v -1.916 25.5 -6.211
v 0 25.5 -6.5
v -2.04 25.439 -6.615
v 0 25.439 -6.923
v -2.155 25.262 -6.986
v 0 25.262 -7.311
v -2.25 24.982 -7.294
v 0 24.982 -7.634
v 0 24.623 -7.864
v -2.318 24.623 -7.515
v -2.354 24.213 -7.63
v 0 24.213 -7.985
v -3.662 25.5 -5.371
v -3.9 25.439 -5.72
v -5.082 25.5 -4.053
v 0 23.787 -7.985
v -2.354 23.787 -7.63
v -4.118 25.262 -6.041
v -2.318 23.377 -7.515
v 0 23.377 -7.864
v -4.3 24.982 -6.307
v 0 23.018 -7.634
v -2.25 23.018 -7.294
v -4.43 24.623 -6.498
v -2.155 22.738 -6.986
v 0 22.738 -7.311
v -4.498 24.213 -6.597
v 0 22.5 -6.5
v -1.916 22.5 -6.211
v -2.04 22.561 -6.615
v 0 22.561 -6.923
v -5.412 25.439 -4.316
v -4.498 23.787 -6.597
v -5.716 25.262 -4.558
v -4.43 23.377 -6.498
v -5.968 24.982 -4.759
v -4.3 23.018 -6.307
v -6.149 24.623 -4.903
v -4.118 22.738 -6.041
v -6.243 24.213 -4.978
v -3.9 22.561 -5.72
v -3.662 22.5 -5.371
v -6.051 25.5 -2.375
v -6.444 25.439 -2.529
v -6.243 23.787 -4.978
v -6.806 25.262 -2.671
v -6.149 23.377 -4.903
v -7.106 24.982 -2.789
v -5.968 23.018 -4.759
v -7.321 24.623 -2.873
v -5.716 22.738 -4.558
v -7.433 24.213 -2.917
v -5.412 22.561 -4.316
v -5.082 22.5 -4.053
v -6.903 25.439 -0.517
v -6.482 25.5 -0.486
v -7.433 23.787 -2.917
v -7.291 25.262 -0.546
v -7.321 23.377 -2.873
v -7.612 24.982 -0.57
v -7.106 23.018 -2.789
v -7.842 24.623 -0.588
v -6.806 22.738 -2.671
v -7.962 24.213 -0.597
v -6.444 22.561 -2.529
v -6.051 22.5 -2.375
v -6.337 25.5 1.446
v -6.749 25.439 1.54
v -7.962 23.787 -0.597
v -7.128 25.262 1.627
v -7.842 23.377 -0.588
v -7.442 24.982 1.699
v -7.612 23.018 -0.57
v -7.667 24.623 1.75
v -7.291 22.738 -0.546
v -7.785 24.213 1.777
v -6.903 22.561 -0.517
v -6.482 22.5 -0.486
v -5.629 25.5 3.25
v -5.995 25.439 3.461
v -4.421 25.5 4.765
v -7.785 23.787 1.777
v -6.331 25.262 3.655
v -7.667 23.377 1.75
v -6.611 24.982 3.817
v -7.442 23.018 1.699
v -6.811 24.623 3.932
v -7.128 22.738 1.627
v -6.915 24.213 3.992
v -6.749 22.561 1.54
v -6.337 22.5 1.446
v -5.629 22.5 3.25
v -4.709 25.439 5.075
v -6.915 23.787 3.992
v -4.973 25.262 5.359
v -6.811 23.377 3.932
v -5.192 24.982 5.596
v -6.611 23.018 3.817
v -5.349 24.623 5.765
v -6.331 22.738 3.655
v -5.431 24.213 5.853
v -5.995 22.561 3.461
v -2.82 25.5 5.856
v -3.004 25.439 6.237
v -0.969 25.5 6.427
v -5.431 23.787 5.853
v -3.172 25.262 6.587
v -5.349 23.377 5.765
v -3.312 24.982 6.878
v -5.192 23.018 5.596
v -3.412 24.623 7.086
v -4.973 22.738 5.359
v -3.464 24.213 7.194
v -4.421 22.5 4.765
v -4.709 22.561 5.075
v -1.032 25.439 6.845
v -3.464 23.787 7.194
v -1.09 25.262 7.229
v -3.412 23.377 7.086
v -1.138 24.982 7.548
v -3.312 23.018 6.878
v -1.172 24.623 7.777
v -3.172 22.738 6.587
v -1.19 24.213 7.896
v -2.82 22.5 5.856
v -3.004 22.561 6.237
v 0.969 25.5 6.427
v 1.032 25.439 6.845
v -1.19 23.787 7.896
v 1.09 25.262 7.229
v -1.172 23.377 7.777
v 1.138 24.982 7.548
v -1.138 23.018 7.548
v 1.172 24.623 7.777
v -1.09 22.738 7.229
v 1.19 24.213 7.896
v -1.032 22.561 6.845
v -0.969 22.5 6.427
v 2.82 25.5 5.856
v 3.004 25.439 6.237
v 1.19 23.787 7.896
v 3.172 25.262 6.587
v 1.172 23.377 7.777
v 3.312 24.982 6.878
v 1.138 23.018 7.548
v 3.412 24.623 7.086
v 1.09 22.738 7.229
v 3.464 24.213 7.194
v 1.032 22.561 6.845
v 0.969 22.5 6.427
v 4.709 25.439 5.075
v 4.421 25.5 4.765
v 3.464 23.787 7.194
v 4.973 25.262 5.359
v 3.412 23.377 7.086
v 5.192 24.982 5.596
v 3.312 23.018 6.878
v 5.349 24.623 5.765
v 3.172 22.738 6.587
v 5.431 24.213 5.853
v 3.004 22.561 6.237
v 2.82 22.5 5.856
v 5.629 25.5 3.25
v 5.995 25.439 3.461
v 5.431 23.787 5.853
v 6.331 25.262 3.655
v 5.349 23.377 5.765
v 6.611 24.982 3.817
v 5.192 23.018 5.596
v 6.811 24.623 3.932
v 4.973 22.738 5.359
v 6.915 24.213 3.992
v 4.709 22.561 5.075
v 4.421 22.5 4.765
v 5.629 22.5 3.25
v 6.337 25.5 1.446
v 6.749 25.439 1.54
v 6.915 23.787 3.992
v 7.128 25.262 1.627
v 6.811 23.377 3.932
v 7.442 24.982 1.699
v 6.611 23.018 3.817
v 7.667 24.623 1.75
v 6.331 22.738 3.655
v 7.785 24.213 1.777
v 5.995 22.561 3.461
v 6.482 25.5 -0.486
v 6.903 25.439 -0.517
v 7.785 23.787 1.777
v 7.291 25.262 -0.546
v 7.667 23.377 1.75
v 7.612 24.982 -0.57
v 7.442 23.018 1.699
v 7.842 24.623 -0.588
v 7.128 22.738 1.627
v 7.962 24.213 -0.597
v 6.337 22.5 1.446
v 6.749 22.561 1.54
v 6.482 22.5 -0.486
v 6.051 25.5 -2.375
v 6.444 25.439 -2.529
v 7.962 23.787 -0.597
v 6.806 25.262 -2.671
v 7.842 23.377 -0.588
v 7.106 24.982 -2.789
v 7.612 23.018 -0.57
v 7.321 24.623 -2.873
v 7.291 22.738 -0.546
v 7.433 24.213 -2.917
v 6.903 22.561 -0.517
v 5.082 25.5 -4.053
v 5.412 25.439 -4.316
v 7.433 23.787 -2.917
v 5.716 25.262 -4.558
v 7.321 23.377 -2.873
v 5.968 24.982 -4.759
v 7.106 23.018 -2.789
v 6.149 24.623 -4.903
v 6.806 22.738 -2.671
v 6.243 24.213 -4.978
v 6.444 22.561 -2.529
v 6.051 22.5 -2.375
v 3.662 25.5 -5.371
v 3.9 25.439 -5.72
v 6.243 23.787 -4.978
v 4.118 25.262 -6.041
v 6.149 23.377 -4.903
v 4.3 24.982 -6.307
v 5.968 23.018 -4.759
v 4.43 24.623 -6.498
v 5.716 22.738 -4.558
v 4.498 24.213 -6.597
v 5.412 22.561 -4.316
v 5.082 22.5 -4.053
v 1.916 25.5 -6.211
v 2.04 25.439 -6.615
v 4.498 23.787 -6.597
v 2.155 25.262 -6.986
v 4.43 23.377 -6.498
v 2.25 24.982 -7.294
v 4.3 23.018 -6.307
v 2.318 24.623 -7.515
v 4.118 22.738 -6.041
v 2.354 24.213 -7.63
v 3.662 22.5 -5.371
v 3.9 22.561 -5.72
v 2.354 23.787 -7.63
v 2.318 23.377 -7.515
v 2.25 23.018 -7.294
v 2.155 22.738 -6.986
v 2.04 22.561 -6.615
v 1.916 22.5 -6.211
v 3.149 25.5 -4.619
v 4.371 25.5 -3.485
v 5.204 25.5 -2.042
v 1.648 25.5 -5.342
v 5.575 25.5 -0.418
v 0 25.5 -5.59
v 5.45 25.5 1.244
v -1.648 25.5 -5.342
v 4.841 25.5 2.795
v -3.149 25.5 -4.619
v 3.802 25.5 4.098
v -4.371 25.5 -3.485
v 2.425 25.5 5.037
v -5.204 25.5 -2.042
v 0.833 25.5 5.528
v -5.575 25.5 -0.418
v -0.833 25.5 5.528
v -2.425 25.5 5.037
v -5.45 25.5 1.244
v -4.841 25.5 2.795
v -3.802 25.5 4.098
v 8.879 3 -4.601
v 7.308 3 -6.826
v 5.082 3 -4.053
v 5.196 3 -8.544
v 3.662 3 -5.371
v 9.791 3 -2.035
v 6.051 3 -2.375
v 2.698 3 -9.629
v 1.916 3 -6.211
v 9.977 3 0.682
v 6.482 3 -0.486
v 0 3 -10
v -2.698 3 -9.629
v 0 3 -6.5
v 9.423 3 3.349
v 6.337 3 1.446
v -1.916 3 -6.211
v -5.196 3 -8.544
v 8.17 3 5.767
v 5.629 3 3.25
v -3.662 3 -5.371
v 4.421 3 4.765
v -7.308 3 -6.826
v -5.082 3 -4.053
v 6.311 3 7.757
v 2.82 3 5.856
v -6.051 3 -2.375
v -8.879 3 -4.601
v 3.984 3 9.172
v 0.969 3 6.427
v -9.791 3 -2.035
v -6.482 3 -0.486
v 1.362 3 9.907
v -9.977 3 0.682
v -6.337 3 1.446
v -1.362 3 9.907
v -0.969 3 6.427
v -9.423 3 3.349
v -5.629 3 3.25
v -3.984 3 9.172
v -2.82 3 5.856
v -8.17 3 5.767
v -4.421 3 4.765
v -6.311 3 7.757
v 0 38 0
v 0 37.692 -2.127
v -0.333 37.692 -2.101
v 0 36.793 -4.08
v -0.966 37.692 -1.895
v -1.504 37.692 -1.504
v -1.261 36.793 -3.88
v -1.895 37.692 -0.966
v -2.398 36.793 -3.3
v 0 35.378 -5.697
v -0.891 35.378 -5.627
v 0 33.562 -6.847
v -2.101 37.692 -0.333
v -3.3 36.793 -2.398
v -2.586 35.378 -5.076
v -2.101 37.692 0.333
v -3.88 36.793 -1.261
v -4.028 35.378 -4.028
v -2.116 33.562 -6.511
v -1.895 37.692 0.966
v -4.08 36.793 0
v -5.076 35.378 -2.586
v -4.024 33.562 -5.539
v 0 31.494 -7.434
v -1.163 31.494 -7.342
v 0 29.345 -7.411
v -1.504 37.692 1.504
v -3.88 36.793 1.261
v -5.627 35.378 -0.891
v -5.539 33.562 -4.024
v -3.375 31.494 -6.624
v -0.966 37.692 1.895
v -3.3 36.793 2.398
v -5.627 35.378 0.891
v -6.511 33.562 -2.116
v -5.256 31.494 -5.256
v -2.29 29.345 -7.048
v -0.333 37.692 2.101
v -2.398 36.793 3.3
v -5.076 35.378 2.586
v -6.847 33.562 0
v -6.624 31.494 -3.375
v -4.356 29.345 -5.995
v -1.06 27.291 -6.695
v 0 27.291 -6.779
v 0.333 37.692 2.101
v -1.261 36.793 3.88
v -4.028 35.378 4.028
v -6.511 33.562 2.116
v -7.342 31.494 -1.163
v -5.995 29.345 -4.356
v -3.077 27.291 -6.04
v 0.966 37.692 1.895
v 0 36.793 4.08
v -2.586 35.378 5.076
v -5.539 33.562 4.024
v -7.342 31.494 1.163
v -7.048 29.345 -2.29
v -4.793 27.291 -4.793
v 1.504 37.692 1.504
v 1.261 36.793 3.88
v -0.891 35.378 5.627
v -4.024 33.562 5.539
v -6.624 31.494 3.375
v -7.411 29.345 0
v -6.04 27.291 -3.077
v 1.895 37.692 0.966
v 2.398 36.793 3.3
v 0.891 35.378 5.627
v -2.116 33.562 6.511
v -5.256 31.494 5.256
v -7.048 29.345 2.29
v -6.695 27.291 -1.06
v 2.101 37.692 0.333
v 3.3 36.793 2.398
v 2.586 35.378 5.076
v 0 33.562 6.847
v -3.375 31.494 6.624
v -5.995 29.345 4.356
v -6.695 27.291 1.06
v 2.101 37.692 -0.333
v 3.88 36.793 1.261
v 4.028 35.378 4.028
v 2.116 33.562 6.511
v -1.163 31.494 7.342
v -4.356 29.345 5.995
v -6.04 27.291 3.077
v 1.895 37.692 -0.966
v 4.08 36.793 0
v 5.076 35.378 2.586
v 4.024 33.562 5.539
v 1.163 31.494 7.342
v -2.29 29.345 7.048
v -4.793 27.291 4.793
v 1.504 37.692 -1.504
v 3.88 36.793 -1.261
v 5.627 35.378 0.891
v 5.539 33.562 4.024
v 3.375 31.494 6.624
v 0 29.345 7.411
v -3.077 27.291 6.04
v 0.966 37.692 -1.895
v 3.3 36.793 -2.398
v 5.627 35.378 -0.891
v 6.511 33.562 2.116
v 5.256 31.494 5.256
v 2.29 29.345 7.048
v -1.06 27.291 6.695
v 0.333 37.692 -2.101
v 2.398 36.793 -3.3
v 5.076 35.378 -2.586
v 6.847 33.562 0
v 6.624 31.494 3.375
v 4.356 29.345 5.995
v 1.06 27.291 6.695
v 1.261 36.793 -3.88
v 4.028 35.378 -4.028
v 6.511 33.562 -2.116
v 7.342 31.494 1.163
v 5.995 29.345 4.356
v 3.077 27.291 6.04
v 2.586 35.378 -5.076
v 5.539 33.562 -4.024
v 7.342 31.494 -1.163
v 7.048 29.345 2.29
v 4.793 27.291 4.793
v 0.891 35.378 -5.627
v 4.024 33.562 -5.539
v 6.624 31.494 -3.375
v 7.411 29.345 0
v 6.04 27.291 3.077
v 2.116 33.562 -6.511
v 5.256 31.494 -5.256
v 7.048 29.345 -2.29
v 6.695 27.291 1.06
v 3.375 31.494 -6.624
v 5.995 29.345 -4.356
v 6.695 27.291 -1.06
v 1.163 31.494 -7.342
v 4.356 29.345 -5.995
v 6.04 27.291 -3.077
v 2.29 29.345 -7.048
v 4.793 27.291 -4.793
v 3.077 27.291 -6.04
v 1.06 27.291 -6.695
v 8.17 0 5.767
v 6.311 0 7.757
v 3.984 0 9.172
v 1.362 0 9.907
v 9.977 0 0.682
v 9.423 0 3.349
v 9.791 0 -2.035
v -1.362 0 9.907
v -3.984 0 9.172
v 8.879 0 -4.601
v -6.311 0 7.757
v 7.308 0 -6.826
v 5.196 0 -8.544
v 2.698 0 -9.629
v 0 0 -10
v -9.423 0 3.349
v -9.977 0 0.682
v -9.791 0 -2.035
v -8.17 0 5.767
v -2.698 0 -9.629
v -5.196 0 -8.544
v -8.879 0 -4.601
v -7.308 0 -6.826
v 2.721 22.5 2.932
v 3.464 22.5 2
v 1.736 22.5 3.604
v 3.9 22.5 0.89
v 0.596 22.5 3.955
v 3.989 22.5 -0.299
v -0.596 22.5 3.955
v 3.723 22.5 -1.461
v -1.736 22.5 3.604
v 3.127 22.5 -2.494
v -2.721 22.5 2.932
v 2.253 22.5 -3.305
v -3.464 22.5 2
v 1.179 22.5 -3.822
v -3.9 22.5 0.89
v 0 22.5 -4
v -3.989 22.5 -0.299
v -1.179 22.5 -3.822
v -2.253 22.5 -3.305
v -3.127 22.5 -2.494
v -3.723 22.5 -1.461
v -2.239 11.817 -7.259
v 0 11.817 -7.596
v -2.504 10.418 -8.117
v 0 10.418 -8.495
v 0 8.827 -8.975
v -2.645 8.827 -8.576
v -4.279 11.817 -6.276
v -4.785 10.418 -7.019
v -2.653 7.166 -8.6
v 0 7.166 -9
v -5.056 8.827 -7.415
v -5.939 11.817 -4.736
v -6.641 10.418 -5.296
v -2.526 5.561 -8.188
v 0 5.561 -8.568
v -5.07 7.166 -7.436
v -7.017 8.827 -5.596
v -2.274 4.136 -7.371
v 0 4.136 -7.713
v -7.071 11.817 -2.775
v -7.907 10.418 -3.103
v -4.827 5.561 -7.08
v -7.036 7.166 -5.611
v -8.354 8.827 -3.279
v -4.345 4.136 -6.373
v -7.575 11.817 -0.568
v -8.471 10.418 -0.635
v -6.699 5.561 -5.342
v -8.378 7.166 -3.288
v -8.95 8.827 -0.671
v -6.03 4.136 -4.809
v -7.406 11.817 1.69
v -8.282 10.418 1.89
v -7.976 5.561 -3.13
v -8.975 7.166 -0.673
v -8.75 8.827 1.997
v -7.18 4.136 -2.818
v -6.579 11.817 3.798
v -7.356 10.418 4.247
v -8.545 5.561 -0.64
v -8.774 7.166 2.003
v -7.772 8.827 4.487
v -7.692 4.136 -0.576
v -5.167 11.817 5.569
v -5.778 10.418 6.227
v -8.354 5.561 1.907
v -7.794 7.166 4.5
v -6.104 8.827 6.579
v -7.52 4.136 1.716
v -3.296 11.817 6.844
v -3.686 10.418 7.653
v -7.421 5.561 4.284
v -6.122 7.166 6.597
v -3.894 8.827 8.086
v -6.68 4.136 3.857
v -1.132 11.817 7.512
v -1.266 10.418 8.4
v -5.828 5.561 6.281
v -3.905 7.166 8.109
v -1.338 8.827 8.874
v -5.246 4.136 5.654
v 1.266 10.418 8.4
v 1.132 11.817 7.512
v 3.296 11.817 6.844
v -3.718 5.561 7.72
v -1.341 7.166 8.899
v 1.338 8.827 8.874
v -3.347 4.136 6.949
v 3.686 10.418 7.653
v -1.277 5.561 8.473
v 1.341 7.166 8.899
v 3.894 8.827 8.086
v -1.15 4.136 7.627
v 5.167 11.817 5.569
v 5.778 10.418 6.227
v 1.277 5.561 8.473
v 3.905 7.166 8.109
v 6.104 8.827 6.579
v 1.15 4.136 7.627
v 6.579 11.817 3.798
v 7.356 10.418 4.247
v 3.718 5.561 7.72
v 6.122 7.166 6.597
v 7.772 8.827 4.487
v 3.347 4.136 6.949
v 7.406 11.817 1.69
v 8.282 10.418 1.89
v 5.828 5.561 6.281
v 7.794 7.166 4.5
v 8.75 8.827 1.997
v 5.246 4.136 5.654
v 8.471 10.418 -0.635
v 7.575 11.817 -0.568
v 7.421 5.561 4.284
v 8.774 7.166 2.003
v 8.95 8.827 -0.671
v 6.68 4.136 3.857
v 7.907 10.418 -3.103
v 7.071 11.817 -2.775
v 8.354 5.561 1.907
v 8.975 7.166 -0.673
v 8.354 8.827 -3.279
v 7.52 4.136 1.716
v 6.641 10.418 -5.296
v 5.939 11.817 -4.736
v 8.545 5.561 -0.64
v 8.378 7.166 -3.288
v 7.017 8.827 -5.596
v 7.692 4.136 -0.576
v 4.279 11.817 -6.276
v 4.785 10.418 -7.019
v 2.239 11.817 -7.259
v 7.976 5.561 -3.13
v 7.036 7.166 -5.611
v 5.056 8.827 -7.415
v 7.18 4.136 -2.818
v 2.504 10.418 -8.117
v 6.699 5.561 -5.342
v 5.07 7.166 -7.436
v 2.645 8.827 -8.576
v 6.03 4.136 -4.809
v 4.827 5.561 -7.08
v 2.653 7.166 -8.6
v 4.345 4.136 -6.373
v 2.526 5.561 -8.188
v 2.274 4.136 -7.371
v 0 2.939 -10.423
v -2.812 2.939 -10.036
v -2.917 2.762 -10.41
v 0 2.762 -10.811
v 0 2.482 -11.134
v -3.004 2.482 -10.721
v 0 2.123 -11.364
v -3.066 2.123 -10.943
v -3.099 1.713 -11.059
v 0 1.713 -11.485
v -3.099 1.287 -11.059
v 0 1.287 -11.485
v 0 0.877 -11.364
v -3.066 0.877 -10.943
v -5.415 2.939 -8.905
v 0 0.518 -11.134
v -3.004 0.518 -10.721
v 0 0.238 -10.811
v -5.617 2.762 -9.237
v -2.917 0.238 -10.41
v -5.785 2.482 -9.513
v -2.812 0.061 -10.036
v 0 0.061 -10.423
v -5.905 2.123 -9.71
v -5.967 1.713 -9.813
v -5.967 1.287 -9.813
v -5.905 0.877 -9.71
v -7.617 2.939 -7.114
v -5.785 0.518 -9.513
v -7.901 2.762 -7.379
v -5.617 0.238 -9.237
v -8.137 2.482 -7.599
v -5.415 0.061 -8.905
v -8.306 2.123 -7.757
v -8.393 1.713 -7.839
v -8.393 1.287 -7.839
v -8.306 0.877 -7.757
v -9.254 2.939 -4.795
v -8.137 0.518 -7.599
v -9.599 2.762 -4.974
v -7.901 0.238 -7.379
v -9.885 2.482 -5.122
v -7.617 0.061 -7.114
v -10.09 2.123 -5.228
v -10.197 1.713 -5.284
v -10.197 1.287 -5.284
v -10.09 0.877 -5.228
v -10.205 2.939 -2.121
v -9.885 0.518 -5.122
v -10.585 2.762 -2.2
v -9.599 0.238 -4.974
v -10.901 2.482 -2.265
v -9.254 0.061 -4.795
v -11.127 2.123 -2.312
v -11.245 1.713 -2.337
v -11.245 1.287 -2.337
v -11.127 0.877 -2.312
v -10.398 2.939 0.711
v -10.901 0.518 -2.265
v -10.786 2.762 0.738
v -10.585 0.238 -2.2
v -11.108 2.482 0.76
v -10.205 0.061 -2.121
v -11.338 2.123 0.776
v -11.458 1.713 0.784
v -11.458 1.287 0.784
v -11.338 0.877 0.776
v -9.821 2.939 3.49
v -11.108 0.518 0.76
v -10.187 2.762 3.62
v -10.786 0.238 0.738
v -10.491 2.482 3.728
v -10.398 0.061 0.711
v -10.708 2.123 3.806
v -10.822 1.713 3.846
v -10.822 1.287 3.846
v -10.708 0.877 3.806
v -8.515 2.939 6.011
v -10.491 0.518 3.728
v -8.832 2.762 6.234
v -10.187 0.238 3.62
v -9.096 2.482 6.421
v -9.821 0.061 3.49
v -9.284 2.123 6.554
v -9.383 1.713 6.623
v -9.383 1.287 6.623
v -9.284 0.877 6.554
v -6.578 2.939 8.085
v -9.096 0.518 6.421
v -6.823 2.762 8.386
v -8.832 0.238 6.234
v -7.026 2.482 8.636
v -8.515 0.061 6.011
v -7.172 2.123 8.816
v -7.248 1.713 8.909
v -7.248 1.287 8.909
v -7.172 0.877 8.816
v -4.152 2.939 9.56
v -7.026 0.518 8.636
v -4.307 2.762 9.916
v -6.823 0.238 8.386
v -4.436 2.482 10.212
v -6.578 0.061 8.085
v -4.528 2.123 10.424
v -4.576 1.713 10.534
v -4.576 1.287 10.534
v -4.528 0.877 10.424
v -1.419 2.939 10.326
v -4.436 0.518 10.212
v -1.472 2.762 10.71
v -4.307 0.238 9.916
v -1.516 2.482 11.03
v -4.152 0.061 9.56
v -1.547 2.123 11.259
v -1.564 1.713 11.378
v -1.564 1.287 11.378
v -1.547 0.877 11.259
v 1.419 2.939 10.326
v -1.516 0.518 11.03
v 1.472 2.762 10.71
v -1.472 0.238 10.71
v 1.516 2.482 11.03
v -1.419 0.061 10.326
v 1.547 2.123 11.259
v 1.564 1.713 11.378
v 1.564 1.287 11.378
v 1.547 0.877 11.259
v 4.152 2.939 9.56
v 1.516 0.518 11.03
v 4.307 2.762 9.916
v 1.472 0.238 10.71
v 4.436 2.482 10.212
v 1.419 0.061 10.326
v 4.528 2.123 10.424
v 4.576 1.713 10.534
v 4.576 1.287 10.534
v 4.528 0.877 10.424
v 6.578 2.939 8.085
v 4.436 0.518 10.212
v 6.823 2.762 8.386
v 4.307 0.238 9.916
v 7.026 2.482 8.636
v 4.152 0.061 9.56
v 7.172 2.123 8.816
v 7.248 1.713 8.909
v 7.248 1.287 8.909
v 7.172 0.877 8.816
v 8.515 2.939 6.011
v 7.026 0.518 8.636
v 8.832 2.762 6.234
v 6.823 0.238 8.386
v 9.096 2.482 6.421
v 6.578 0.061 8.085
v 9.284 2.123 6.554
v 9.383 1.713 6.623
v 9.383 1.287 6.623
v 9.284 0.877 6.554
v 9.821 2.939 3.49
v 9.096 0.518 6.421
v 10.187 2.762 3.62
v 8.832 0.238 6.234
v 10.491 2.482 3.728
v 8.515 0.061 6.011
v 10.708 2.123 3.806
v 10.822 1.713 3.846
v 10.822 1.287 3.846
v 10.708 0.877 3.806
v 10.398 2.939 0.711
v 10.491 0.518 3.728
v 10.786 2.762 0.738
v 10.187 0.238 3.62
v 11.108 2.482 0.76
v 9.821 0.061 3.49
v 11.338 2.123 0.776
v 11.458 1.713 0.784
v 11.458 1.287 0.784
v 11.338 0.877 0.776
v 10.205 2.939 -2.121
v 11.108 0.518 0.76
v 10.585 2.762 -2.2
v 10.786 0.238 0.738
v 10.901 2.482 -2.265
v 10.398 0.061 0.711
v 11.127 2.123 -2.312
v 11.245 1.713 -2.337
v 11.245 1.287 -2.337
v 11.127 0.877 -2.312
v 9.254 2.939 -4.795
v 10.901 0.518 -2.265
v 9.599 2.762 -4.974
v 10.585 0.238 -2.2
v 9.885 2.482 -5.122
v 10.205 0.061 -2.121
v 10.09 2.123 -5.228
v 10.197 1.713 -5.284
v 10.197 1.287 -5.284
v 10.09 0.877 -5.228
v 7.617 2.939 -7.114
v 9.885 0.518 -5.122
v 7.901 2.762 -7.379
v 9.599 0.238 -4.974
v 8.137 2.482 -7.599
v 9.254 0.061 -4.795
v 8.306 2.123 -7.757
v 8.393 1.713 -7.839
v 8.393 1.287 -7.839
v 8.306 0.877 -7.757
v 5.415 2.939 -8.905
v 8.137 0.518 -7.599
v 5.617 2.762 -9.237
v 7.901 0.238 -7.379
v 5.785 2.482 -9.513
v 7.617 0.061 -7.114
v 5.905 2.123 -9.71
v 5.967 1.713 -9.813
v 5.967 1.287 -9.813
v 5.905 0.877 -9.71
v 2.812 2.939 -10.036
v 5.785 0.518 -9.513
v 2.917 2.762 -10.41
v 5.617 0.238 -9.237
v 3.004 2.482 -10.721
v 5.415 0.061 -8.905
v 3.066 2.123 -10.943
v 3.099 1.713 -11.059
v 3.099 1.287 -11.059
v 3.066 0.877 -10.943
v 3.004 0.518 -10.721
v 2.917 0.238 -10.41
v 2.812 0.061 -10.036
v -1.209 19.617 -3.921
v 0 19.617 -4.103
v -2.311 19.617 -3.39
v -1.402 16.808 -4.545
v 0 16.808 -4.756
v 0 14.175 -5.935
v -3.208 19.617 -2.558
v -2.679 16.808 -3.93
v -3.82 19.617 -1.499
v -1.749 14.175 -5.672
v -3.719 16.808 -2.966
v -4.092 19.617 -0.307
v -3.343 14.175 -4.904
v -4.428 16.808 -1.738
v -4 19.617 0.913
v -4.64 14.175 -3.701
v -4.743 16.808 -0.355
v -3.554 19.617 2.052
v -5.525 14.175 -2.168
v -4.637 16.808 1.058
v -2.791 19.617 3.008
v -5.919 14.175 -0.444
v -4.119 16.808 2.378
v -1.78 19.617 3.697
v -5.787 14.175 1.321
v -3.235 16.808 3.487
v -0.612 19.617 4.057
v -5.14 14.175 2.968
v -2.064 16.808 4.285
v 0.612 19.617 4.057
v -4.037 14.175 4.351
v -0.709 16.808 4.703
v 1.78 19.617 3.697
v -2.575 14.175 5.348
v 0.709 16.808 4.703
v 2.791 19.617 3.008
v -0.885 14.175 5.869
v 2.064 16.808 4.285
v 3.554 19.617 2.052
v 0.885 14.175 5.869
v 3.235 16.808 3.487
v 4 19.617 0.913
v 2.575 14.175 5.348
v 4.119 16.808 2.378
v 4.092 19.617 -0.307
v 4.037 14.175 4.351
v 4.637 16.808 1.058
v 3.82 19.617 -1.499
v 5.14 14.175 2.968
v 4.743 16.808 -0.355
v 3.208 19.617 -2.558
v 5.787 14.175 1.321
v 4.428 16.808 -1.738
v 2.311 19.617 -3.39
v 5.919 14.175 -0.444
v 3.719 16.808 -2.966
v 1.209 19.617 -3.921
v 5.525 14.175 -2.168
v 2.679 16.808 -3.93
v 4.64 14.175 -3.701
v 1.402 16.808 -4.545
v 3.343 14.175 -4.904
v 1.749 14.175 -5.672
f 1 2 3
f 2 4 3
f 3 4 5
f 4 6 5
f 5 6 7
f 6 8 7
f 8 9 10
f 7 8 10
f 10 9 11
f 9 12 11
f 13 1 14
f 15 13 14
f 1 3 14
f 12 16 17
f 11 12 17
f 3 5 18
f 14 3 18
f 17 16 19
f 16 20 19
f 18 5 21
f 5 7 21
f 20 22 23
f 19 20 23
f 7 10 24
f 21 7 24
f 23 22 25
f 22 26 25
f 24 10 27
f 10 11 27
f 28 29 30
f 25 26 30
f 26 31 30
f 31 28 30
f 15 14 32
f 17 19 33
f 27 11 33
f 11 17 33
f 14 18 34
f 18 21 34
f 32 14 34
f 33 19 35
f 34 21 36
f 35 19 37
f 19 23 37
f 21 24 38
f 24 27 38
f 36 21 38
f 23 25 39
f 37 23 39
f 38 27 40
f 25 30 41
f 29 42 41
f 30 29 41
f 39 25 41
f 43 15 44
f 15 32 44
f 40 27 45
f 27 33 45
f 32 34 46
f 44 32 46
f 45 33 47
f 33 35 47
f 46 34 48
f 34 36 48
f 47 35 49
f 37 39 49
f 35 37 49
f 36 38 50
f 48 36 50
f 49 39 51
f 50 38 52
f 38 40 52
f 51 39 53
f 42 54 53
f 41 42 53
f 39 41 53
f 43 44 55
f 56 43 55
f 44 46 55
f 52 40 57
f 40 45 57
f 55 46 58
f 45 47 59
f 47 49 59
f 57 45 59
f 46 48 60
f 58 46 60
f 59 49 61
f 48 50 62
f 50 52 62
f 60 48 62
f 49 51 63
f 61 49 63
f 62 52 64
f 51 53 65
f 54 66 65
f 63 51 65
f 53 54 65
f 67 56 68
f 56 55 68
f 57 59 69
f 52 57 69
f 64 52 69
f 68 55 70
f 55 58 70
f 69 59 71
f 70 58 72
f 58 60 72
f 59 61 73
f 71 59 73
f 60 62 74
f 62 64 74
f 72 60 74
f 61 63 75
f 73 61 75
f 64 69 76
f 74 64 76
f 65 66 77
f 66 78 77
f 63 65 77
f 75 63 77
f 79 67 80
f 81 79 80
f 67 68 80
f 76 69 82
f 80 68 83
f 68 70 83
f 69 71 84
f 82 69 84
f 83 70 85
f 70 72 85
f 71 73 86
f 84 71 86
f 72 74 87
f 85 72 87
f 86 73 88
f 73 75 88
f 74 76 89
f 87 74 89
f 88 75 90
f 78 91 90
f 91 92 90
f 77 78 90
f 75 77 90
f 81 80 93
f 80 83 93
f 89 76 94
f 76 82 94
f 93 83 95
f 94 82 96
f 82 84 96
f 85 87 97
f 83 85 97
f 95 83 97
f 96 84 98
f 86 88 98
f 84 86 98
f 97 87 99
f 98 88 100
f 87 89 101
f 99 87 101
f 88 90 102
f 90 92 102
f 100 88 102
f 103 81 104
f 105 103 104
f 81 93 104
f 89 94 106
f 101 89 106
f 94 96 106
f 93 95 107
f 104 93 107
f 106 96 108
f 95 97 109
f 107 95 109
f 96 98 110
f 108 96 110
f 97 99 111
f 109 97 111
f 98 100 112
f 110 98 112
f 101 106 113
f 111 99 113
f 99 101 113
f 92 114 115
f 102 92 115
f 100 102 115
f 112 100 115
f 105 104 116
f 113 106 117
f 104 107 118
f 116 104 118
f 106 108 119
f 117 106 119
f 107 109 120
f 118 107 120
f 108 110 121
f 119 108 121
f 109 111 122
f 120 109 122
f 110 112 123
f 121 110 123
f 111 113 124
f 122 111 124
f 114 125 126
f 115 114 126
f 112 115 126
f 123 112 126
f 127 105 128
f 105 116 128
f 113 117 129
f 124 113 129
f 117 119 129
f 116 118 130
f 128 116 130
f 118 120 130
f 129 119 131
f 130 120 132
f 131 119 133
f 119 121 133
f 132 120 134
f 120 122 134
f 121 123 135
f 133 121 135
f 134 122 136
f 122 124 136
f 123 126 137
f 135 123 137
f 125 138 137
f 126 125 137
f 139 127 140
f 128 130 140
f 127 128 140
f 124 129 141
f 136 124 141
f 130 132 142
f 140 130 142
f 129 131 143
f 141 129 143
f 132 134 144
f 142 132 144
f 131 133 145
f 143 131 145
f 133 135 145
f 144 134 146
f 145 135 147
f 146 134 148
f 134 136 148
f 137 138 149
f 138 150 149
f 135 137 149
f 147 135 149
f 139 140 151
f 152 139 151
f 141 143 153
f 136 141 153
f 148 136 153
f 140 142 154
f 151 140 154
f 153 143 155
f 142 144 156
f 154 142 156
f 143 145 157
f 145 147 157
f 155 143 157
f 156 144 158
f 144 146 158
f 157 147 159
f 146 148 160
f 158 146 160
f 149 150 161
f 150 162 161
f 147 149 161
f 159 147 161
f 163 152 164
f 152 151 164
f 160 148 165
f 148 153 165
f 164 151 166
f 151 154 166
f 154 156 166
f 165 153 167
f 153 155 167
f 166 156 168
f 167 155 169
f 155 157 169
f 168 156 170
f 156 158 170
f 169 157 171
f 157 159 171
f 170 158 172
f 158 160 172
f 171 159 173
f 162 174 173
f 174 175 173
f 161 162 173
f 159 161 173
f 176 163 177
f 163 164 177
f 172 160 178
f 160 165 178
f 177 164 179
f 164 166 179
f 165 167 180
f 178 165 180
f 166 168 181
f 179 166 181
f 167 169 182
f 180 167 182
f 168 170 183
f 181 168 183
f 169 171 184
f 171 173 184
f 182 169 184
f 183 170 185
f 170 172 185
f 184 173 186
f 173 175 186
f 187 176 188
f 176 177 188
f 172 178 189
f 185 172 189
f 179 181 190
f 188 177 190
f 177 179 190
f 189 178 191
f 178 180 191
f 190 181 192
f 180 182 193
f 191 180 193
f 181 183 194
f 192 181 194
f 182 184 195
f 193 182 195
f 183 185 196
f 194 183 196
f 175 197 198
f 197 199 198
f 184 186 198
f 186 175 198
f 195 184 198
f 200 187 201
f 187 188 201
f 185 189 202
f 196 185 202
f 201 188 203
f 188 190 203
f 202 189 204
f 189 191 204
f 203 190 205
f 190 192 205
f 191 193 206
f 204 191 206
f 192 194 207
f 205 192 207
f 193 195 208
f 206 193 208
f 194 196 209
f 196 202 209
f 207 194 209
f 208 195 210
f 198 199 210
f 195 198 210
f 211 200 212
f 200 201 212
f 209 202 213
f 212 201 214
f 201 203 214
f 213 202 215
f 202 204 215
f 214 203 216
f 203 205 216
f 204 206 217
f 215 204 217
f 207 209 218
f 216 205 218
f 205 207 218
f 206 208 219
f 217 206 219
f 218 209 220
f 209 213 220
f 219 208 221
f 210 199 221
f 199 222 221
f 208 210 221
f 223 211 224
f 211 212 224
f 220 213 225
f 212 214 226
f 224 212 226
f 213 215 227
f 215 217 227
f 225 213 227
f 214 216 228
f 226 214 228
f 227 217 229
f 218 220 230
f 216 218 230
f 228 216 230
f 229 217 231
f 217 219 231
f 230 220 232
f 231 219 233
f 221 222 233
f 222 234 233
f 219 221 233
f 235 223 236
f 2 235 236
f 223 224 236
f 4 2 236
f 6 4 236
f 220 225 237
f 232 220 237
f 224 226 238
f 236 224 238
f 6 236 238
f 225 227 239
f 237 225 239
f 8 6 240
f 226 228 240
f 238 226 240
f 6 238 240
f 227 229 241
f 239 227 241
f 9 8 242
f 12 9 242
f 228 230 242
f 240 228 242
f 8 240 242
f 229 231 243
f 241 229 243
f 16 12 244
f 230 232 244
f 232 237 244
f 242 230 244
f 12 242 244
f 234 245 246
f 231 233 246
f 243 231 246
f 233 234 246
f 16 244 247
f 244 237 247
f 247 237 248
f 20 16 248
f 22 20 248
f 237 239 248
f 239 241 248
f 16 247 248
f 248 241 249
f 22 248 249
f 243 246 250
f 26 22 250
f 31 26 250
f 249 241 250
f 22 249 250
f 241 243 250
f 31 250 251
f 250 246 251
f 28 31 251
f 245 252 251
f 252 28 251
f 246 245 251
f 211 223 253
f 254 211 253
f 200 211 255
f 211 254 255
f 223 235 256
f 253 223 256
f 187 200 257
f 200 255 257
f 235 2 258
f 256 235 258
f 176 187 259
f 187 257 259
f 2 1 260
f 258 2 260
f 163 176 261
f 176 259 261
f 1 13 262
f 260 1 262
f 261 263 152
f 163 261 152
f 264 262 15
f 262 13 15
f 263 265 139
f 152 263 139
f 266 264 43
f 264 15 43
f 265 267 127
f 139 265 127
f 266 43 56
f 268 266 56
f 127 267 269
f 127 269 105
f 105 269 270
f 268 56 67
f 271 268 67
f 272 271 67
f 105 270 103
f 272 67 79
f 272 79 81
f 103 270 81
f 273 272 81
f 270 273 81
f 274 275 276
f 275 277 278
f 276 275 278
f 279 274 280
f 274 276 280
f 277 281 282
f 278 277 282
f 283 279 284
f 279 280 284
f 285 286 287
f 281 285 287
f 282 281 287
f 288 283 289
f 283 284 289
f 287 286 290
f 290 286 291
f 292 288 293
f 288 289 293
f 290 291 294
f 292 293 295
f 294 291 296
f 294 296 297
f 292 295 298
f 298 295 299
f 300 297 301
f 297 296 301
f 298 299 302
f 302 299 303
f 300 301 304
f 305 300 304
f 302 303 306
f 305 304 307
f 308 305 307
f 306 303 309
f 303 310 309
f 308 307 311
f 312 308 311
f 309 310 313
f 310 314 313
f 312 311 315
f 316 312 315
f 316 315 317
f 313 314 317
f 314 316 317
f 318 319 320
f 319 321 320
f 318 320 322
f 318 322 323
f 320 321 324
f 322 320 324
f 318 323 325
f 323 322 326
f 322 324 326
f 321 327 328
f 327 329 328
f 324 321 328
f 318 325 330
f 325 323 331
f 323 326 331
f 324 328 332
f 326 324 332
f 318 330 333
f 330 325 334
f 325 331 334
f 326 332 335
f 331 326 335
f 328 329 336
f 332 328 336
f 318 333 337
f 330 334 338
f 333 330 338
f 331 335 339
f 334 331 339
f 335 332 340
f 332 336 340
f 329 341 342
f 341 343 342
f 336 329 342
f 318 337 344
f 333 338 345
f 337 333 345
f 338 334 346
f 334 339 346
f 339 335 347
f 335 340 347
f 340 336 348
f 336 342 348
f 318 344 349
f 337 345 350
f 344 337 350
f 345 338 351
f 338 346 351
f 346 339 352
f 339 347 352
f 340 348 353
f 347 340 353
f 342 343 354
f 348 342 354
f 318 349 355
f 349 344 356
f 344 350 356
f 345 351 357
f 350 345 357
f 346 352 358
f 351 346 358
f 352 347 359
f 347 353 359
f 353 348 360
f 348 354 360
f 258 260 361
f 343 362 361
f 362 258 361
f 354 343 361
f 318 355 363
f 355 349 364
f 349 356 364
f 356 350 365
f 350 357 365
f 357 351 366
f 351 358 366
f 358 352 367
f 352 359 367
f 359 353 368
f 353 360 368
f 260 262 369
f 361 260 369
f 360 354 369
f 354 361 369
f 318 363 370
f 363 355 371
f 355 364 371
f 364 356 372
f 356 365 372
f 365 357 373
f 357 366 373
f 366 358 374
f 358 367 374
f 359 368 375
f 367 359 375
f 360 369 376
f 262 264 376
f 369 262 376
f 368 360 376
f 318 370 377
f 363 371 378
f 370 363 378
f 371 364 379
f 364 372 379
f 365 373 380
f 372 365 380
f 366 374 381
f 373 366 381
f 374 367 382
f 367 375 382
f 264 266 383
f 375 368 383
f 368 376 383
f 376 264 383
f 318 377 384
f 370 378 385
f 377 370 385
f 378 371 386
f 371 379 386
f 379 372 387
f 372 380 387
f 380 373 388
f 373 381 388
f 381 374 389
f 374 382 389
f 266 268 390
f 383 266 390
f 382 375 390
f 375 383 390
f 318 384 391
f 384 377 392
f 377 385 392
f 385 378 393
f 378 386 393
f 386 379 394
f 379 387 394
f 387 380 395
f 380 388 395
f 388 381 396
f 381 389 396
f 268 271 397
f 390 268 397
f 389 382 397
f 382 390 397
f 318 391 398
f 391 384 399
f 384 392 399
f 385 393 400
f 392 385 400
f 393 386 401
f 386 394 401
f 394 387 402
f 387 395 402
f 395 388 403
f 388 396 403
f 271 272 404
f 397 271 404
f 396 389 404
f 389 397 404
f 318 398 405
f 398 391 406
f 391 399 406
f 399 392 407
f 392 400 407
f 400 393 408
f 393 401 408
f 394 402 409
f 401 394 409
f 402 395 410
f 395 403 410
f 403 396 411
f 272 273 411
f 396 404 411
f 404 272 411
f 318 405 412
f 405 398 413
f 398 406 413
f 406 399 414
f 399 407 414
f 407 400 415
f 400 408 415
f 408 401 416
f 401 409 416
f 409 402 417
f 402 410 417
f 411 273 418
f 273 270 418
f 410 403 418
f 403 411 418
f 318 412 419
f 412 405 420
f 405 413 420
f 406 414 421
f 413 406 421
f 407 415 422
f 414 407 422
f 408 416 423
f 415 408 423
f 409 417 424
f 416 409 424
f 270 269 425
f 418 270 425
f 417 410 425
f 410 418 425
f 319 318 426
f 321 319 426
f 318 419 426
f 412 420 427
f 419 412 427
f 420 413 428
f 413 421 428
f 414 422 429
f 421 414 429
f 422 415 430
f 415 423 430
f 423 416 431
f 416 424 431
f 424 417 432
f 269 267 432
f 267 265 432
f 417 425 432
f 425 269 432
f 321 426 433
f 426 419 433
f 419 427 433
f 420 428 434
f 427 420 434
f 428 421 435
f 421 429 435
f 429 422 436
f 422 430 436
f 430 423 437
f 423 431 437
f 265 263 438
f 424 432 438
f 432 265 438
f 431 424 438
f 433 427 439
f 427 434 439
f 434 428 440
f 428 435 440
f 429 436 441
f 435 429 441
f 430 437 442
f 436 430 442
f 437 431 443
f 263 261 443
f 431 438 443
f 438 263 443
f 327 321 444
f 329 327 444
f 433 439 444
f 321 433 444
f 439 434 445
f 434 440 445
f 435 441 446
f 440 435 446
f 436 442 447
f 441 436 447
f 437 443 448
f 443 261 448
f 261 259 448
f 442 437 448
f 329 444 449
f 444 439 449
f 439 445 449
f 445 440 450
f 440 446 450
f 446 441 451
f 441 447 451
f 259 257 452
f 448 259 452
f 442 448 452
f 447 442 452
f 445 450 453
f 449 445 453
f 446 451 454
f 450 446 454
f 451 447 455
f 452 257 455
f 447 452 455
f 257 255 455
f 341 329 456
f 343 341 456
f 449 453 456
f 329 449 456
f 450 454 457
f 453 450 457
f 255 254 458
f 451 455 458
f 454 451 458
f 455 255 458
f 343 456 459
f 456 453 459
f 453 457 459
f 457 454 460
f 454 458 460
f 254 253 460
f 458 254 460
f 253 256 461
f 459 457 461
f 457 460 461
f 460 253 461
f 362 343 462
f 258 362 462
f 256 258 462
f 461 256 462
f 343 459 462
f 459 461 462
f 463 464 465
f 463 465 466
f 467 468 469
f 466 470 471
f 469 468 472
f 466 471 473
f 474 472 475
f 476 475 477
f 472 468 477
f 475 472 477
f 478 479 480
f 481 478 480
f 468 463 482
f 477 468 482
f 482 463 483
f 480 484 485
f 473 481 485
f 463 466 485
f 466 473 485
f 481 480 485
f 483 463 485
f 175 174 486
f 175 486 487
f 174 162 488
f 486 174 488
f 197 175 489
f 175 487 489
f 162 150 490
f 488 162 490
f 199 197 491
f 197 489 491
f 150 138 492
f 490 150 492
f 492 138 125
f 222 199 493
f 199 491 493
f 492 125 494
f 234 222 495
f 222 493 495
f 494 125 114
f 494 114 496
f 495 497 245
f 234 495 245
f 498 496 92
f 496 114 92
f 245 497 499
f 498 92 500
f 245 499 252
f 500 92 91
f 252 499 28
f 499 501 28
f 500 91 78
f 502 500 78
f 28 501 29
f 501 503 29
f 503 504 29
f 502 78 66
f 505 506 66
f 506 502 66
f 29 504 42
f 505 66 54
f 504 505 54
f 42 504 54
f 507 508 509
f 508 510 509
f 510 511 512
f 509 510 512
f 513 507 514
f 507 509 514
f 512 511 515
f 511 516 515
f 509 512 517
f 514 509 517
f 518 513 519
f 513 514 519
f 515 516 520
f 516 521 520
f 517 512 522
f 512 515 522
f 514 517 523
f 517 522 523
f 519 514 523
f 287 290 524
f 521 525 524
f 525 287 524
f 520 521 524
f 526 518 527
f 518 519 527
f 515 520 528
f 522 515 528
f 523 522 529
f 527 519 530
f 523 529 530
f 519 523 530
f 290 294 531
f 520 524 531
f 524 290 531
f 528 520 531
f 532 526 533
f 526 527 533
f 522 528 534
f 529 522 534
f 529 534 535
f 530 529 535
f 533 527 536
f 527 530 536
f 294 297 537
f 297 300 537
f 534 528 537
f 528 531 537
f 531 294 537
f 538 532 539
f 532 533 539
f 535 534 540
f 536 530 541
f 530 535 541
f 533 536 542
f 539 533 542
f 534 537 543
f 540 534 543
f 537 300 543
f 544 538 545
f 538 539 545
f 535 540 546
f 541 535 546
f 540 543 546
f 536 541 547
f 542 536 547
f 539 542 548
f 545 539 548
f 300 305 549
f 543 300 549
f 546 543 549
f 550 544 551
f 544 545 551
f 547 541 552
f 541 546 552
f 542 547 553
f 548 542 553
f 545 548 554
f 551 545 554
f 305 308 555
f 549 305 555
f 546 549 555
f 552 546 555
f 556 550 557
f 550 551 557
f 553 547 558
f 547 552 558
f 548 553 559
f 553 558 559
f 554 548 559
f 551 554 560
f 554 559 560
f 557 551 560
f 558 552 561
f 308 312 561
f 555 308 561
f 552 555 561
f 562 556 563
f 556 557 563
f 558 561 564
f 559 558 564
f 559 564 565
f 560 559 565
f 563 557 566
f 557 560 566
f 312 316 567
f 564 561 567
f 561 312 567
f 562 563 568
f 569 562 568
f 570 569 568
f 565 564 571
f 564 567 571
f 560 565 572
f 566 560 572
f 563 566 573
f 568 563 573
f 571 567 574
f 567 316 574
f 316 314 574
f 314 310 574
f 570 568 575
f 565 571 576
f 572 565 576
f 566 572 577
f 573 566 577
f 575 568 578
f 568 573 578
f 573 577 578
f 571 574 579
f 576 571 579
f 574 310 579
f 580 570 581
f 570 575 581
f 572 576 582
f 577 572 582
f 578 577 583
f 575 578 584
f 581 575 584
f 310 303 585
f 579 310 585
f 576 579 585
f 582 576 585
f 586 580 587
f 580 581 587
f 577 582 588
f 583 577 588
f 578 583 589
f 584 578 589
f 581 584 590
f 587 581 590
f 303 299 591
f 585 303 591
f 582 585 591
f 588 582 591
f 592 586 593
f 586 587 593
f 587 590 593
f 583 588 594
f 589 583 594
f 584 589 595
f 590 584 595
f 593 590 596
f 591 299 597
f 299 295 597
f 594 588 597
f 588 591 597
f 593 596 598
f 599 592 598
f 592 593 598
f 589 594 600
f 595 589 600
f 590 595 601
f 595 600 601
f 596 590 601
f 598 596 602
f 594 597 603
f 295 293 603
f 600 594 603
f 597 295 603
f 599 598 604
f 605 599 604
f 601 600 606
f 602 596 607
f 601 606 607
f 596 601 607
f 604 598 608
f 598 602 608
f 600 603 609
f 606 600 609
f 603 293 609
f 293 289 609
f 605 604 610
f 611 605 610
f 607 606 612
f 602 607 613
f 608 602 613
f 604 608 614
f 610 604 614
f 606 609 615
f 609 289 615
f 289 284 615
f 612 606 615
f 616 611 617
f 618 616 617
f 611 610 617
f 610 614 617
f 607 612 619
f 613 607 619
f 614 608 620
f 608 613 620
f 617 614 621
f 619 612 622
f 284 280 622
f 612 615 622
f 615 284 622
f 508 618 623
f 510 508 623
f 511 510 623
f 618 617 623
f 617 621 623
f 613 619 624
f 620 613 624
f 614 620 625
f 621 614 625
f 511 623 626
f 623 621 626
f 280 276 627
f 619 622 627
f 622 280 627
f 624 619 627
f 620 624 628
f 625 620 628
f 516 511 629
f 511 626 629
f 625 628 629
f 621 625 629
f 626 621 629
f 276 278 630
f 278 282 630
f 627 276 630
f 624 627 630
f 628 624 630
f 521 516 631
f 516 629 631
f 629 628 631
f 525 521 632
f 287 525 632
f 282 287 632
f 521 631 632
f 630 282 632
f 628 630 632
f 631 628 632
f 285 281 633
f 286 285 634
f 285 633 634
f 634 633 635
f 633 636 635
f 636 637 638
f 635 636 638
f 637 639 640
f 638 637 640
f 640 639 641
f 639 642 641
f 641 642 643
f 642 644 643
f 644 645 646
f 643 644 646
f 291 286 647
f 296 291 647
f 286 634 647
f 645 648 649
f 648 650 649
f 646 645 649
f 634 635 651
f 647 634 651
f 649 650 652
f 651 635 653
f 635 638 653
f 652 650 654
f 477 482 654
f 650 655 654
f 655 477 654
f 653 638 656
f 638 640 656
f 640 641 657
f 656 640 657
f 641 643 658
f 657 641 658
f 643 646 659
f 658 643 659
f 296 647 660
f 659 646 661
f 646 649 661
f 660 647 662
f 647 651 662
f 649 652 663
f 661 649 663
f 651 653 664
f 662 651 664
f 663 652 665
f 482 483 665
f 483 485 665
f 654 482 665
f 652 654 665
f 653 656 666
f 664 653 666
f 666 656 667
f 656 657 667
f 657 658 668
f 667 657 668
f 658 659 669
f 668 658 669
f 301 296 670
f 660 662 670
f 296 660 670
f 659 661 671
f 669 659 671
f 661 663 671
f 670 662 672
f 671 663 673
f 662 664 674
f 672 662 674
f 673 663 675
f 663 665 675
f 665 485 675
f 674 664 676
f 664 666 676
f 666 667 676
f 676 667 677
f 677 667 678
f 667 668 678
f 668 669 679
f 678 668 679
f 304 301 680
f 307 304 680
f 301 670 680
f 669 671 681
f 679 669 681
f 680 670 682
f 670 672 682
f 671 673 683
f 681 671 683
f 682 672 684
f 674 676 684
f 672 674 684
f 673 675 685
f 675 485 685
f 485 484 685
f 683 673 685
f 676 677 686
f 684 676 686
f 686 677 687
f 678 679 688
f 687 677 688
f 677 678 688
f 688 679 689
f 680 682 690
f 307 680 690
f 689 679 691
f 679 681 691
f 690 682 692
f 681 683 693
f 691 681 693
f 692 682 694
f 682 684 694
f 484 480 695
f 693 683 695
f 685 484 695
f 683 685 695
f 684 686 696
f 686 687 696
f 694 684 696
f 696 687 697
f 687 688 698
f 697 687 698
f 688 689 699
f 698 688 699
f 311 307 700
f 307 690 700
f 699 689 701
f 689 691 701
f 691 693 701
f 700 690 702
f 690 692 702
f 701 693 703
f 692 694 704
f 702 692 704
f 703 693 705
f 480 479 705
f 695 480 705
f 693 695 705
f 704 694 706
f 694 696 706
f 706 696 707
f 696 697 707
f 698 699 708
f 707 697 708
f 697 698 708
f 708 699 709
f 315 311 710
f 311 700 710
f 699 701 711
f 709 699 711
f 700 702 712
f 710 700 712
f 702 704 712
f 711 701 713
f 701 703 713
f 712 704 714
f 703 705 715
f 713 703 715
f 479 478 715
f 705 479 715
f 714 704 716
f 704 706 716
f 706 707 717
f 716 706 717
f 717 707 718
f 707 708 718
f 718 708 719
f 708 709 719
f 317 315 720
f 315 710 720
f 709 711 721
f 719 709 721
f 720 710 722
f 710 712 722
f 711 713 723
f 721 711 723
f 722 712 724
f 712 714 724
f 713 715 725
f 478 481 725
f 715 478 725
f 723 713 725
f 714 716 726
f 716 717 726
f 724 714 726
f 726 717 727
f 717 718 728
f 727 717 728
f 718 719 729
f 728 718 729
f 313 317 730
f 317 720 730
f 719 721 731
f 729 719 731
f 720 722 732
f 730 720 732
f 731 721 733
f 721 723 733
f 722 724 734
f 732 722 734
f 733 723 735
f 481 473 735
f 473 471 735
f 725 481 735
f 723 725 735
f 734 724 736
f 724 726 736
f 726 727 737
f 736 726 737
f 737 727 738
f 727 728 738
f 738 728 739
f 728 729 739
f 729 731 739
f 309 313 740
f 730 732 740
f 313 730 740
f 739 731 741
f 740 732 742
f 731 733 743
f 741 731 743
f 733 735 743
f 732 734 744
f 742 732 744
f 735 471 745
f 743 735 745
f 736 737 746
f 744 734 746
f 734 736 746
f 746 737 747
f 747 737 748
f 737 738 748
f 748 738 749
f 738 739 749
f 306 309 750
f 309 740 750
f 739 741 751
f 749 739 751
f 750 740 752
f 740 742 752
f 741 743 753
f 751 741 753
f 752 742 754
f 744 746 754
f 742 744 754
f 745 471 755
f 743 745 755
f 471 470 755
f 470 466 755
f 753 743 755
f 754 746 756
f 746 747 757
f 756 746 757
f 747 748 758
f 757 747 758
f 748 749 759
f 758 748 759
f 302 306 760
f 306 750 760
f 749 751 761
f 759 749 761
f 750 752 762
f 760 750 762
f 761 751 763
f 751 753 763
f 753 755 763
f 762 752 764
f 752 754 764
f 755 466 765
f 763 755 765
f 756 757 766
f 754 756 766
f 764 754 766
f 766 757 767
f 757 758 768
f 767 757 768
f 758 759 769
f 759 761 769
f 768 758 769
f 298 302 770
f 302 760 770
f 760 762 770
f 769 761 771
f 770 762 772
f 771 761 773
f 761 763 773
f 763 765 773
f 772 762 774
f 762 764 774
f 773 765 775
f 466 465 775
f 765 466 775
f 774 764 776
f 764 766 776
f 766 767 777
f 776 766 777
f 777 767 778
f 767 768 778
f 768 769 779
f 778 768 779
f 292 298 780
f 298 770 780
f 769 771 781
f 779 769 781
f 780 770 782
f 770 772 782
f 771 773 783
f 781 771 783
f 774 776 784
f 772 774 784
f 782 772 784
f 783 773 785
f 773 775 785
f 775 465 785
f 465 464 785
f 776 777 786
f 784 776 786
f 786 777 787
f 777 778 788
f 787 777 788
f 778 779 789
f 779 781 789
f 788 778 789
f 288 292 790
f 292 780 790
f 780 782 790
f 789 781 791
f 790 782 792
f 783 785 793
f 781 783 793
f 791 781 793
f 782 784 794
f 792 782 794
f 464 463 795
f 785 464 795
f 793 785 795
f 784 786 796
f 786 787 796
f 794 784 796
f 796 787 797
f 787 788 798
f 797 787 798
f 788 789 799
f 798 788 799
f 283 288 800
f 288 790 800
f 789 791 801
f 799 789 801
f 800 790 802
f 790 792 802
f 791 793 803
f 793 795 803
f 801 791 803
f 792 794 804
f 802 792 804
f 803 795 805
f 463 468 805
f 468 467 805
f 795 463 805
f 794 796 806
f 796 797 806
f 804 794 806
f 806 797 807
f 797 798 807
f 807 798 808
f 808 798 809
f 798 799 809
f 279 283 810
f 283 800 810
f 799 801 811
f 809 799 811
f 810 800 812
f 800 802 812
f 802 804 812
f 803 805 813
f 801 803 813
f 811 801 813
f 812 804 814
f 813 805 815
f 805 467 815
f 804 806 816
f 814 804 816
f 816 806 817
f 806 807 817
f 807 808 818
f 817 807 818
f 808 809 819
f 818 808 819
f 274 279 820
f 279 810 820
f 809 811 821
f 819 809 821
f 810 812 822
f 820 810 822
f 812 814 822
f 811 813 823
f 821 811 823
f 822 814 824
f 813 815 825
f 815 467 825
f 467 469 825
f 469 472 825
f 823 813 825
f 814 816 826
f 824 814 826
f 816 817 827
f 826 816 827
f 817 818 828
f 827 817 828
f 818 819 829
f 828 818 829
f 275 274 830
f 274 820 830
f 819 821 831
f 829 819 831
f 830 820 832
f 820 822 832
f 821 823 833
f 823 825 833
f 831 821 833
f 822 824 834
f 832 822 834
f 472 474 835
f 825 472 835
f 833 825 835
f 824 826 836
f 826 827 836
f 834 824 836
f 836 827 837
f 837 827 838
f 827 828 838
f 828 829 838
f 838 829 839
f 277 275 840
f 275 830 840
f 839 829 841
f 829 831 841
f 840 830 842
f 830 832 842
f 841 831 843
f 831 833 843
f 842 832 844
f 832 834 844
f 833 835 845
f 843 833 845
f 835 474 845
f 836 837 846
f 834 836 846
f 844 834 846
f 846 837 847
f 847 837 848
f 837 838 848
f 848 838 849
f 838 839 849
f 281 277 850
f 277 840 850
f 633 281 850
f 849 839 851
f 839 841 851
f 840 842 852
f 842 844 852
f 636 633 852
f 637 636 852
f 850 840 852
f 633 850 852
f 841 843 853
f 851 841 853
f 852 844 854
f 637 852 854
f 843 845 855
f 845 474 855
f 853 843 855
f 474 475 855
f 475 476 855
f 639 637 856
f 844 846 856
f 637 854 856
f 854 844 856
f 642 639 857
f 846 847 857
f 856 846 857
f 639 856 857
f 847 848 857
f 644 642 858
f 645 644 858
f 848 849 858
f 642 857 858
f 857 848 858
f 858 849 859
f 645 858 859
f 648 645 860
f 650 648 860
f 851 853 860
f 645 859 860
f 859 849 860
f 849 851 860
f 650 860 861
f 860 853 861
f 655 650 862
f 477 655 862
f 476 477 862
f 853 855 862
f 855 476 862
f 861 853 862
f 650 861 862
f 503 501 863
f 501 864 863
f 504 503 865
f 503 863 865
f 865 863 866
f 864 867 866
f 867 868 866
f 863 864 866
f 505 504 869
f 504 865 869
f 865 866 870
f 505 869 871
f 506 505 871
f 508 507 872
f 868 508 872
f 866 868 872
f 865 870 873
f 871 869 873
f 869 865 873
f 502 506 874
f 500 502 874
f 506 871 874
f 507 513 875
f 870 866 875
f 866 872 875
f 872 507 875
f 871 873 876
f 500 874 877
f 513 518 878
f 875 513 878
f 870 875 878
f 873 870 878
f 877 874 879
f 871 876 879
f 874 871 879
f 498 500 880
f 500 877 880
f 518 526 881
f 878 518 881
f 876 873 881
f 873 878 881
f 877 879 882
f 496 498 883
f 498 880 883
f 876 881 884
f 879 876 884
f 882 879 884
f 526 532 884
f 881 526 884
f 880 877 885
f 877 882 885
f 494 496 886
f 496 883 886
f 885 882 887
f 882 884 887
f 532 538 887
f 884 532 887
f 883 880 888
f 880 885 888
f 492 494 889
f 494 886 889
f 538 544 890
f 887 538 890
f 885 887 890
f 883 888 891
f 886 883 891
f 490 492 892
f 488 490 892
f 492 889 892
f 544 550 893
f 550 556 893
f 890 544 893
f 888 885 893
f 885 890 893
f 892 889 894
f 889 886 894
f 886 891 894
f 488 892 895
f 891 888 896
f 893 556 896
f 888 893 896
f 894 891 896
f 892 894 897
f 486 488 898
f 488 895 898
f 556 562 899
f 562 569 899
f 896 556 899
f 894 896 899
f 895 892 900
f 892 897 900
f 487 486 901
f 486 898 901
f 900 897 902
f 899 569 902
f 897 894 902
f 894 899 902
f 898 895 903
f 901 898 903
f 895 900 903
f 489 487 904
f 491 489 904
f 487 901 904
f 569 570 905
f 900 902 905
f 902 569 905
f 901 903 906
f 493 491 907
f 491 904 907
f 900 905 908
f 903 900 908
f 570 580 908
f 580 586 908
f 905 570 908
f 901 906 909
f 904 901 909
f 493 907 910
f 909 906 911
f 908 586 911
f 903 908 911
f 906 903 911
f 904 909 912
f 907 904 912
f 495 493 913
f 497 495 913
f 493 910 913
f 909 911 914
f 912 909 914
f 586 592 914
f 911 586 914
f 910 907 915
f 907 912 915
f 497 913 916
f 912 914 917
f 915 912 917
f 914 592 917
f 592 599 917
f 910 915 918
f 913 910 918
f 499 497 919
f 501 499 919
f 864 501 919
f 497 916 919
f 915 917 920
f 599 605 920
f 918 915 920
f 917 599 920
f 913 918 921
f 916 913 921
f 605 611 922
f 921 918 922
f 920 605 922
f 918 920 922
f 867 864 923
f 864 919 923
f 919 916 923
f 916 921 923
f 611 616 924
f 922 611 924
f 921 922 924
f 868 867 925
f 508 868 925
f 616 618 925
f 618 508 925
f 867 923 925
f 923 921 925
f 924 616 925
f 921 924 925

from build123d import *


with BuildPart() as part:
    # Sketch1 → Revolve2 (revolve)
    with BuildSketch(Plane.XY, mode=Mode.PRIVATE) as revolve2_sk:
        with BuildLine():
            Line((-10, 0), (0, 0))
            Line((0, 0), (0, 3))
            Line((0, 3), (-6.5, 3))
            Line((-6.5, 3), (-10, 3))
            ThreePointArc((-10, 3), (-11.5, 1.5), (-10, 0))
        make_face()
        with BuildLine():
            Line((-6.5, 3), (0, 3))
            Line((0, 3), (0, 22.5))
            Line((0, 22.5), (-4, 22.5))
            ThreePointArc((-4, 22.5), (-4.756442138, 16.807641551), (-7.596345767, 11.816639968))
            ThreePointArc((-7.596345767, 11.816639968), (-9, 7.165611038), (-6.5, 3))
        make_face()
        with BuildLine():
            Line((-4, 22.5), (0, 22.5))
            Line((0, 22.5), (0, 25.5))
            Line((0, 25.5), (-5.590169944, 25.5))
            Line((-5.590169944, 25.5), (-6.5, 25.5))
            ThreePointArc((-6.5, 25.5), (-8, 24), (-6.5, 22.5))
            Line((-6.5, 22.5), (-4, 22.5))
        make_face()
        with BuildLine():
            Line((-5.590169944, 25.5), (0, 25.5))
            Line((0, 25.5), (0, 38))
            ThreePointArc((0, 38), (-6.846531969, 33.561862178), (-5.590169944, 25.5))
        make_face()
    revolve(revolve2_sk.sketch.rotate(Axis((0, 0, 0), (0, 1, 0)), 270), axis=Axis((0, 0, 0), (0, 1, 0)))


solid = part.part
